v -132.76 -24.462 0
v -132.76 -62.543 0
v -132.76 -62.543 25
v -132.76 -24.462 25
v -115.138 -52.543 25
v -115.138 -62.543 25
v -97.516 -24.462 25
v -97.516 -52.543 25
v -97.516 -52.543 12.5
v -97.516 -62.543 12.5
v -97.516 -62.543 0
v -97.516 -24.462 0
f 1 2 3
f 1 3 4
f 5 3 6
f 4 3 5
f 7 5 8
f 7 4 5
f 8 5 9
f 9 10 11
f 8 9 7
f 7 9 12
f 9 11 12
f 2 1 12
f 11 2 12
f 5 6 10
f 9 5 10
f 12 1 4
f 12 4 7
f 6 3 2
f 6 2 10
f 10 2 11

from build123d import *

# Parameters (mm, degrees)
F0_W     = 35.243742
F0_H     = 38.081205
F1_DEPTH = 25
F3_DEPTH = 10


with BuildPart() as f1:
    # F0 (on Top) → F1 (new body)
    with BuildSketch(Plane.XY):
        with Locations((-115.13764, -43.502171)):
            Rectangle(F0_W, F0_H)
    extrude(amount=F1_DEPTH)

    # F2 (on face) → F3 (cut)
    with BuildSketch(Plane.XZ.offset(62.542774)):
        Polygon((-115.13764, 25), (-97.515769, 12.5), (-97.515769, 25), align=None)
    extrude(amount=-F3_DEPTH, mode=Mode.SUBTRACT)


solid = f1.part
